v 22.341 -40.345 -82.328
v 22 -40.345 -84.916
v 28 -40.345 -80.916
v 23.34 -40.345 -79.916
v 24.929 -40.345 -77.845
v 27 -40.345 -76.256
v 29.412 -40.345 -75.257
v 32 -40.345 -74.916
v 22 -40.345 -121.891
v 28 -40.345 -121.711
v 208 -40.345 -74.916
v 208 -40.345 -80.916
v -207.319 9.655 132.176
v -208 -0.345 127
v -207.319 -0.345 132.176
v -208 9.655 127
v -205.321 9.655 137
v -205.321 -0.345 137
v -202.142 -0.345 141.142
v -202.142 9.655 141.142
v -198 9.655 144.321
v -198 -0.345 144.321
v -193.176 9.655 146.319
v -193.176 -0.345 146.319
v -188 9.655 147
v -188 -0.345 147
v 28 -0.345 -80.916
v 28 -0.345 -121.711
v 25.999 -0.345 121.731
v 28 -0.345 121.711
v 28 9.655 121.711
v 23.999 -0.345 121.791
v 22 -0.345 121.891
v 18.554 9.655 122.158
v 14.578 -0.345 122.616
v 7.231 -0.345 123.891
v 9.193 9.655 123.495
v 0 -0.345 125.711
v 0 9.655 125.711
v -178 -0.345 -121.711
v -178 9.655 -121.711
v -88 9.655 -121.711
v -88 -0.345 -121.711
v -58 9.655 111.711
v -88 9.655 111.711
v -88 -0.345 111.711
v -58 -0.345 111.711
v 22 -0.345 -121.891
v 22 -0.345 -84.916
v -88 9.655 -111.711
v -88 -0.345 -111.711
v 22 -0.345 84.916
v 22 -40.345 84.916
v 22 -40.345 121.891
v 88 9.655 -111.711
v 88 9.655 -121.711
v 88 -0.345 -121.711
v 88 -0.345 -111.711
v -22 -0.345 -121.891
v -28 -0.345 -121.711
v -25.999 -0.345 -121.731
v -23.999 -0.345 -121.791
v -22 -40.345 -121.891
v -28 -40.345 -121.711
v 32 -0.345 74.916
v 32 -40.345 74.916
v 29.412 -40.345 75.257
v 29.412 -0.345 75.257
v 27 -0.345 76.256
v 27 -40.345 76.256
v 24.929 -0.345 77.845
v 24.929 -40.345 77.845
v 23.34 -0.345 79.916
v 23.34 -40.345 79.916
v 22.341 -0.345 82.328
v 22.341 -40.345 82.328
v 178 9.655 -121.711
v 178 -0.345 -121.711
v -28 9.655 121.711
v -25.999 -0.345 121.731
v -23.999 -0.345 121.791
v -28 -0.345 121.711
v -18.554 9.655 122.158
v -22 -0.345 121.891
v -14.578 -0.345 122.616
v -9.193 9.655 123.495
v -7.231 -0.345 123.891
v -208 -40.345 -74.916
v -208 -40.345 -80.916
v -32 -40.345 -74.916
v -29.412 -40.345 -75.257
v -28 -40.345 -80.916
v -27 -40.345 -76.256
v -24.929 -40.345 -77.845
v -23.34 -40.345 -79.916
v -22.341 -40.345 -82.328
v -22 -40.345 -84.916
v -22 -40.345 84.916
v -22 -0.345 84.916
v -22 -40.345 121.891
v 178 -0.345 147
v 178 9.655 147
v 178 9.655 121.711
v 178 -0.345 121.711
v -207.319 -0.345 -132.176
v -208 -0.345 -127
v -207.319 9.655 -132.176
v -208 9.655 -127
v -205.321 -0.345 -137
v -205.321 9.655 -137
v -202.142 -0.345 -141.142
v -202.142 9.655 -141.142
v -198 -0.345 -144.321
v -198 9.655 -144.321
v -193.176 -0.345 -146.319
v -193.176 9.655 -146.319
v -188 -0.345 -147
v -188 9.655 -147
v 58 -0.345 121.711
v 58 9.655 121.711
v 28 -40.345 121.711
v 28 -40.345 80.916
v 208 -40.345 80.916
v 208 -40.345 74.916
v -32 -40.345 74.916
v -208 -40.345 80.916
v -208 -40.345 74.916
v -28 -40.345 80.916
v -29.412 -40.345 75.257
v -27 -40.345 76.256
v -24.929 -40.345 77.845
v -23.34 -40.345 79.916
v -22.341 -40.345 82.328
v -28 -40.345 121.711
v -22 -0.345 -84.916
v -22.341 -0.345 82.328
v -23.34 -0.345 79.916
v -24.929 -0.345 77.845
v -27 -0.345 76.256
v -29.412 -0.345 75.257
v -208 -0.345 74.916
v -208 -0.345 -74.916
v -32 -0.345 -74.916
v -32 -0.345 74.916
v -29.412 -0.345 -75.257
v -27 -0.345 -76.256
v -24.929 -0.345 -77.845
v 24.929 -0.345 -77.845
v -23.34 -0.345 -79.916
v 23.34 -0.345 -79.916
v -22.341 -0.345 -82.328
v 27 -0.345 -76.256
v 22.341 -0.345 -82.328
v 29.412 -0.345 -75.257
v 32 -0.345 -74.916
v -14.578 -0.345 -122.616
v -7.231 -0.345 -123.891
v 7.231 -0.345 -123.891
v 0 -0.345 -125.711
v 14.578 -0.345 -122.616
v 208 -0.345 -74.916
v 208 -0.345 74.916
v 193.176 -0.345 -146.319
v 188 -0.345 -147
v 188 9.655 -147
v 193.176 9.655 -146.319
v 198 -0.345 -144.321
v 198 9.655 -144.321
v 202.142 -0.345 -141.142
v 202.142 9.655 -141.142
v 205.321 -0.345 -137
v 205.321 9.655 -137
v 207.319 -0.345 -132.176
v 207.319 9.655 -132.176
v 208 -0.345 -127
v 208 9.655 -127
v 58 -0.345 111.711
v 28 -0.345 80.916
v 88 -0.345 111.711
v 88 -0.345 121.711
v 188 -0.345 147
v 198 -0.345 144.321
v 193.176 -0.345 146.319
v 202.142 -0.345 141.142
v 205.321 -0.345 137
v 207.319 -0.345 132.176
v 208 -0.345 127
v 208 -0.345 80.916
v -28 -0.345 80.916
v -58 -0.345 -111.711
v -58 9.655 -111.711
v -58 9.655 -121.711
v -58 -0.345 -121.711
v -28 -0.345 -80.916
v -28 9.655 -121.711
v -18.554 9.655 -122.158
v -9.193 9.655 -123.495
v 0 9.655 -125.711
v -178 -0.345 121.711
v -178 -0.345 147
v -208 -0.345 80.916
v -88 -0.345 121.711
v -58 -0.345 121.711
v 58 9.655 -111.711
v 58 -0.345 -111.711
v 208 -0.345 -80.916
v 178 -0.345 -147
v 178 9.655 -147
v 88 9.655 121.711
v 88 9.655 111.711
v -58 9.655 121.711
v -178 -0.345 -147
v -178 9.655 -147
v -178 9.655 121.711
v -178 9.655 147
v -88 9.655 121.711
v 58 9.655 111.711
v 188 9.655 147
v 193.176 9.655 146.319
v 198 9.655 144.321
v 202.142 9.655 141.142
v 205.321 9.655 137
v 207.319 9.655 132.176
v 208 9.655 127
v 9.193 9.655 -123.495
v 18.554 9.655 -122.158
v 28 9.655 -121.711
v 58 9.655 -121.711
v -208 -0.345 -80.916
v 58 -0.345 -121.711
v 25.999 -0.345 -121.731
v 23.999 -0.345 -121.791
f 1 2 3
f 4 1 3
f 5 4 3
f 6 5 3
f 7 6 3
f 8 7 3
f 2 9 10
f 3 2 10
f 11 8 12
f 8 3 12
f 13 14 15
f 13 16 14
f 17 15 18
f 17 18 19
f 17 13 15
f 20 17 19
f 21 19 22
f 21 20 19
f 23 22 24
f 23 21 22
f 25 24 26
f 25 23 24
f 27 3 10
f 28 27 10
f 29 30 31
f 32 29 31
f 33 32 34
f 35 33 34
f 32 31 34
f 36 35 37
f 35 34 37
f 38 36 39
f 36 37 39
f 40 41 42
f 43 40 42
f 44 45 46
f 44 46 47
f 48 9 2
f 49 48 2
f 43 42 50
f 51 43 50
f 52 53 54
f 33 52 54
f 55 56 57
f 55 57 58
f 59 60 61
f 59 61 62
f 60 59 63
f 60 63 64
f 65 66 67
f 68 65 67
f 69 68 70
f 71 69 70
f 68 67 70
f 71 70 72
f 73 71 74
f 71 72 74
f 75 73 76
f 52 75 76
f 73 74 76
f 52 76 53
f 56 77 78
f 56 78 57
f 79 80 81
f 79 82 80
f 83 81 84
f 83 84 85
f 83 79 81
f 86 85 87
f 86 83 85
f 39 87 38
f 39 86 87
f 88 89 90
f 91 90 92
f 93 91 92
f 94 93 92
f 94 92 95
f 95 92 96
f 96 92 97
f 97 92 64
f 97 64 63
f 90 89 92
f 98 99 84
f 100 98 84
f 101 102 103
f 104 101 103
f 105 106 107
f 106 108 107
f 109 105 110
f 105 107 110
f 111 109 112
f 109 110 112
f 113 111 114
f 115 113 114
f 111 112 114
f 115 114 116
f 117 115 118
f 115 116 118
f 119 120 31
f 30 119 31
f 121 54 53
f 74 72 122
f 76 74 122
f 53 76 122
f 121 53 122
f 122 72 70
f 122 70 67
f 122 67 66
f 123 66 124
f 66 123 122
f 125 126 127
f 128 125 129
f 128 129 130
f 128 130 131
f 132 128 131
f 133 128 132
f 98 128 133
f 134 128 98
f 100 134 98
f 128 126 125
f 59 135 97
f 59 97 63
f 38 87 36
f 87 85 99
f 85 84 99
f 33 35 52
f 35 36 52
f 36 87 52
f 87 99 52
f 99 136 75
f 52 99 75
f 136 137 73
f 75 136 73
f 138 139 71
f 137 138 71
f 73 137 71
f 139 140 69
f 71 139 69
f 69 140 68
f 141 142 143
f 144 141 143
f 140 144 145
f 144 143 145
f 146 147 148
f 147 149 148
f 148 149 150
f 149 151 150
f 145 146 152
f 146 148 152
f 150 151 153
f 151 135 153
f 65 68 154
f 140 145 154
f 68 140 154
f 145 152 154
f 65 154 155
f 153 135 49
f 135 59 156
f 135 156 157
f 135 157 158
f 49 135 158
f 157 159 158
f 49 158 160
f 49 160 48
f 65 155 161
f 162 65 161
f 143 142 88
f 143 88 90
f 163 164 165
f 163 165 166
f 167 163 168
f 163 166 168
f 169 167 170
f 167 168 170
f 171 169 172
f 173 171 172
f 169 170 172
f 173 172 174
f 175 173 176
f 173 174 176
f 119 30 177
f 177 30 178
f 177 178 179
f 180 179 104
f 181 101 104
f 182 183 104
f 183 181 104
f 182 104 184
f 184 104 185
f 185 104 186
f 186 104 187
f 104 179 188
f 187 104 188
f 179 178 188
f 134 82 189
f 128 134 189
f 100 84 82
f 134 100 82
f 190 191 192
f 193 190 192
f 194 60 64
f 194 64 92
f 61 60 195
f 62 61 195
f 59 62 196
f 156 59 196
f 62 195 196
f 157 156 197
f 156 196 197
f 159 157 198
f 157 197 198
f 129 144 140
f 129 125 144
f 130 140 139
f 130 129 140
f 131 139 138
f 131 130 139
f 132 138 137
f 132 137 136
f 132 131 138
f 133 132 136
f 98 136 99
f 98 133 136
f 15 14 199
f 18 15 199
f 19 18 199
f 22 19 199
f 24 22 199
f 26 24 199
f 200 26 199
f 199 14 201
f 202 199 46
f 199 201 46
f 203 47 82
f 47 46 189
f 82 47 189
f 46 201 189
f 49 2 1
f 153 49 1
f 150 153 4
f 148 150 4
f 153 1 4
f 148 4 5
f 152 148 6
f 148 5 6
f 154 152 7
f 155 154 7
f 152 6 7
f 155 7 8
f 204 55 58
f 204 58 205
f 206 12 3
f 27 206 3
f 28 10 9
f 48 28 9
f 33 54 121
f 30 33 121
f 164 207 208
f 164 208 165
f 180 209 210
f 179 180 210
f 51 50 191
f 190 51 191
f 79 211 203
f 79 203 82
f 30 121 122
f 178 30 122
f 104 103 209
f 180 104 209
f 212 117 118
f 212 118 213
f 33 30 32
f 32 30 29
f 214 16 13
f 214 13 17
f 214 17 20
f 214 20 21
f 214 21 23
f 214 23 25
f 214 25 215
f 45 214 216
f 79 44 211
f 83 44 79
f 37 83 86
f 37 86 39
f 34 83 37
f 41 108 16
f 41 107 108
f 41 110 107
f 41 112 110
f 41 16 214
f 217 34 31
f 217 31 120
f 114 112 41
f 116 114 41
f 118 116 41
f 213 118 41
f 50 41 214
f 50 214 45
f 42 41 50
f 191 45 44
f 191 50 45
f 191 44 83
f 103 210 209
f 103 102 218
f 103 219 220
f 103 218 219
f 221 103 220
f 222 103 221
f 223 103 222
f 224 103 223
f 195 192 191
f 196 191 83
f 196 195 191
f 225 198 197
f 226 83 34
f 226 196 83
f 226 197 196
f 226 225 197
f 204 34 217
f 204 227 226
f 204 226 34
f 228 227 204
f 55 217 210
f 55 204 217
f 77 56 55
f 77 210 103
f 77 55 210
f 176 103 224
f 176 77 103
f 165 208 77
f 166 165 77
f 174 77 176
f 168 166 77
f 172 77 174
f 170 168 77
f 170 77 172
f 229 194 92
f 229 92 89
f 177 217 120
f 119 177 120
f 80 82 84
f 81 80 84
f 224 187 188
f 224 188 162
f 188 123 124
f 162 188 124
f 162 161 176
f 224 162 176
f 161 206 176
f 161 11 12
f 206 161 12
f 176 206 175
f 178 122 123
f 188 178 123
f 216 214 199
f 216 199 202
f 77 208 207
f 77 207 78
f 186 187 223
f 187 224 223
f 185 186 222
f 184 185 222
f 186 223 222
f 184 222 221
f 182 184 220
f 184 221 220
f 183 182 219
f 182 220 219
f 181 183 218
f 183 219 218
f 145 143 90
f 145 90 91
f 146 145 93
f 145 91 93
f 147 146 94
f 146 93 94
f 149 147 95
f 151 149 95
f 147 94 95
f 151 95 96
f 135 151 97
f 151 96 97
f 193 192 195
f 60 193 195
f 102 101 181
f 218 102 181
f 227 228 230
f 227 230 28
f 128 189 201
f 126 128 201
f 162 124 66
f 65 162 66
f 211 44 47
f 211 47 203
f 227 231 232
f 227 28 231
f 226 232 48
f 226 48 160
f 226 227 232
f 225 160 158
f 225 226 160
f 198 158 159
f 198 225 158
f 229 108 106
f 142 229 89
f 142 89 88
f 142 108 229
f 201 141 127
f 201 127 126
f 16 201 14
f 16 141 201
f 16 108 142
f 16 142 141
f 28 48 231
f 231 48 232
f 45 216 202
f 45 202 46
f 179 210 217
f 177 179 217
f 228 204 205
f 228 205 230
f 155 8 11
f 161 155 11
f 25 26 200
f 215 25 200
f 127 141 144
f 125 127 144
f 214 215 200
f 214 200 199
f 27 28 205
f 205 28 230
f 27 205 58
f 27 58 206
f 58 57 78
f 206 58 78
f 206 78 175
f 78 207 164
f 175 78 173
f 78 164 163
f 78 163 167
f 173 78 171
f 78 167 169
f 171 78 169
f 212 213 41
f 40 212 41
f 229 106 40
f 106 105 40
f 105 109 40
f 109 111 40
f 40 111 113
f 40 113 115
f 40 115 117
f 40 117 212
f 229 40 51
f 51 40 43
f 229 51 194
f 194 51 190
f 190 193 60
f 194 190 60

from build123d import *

# Parameters (mm, degrees)
CROQUIS1_W               = 208
CROQUIS1_H               = 147
SALIENTE_EXTRUIR1_DEPTH  = 5
CORTAR_EXTRUIR1_DEPTH    = 128.449009412
SIMETR_A2_COPY_1_DEPTH   = 128.449009412
REDONDEO1_R              = 10
SALIENTE_EXTRUIR3_DEPTH  = 20
REDONDEO2_R              = 5
REDONDEO2_OF_SIMETR_A3_R = 5
SIMETR_A4_START          = -20
SIMETR_A4_DEPTH          = 20
ESCALA1_SCALE            = 2


# Read off the part's stored shape, not the designer's step: Simetría4
with BuildPart() as part:
    # Croquis1 → Saliente-Extruir1 (new body)
    with BuildSketch(Plane(origin=(0, 0, 0), x_dir=(1, 0, 0), z_dir=(0, 1, 0))):
        Rectangle(CROQUIS1_W, CROQUIS1_H)
    extrude(amount=SALIENTE_EXTRUIR1_DEPTH)

    # Croquis3 → Cortar-Extruir1 (cut, through all)
    with BuildSketch(Plane(origin=(0, 5, 0), x_dir=(1, 0, 0), z_dir=(0, 1, 0))):
        with BuildLine():
            Line((-89, 80.855395091), (-89, 60.855395091))
            Line((-89, 60.855395091), (-44, 60.855395091))
            Line((-44, 60.855395091), (-44, 55.855395091))
            Line((-44, 55.855395091), (-29, 55.855395091))
            Line((-29, 55.855395091), (-29, 60.855395091))
            Line((-29, 60.855395091), (-14, 60.855395091))
            ThreePointArc((-14, 60.855395091), (-6.928932188, 61.357920408), (0, 62.855395091))
            Line((0, 62.855395091), (0, 82.855395091))
            Line((0, 82.855395091), (-89, 82.855395091))
            Line((-89, 82.855395091), (-89, 80.855395091))
        make_face()
    cortar_extruir1 = extrude(amount=-CORTAR_EXTRUIR1_DEPTH, mode=Mode.SUBTRACT)

    # Simetría1: Cortar-Extruir1 across plane
    add(cortar_extruir1.mirror(Plane.XY), mode=Mode.SUBTRACT)

    # Simetría2: Cortar-Extruir1 across plane
    add(cortar_extruir1.mirror(Plane(origin=(0, 0, 0), x_dir=(0, 0, 1), z_dir=(1, 0, 0))), mode=Mode.SUBTRACT)

    # Simetría2 copy 1 sketch → Simetría2 copy 1 (cut, through all)
    with BuildSketch(Plane(origin=(0, 5, 0), x_dir=(-1, 0, 0), z_dir=(0, 1, 0))):
        with BuildLine():
            Line((-89, 80.855395091), (-89, 60.855395091))
            Line((-89, 60.855395091), (-44, 60.855395091))
            Line((-44, 60.855395091), (-44, 55.855395091))
            Line((-44, 55.855395091), (-29, 55.855395091))
            Line((-29, 55.855395091), (-29, 60.855395091))
            Line((-29, 60.855395091), (-14, 60.855395091))
            ThreePointArc((-14, 60.855395091), (-6.928932188, 61.357920408), (0, 62.855395091))
            Line((0, 62.855395091), (0, 82.855395091))
            Line((0, 82.855395091), (-89, 82.855395091))
            Line((-89, 82.855395091), (-89, 80.855395091))
        make_face()
    extrude(amount=-SIMETR_A2_COPY_1_DEPTH, mode=Mode.SUBTRACT)

    # Redondeo1
    redondeo1_edges = [part.edges().sort_by_distance(p)[0] for p in [
        (-104, 2.5, -73.5),
        (104, 2.5, -73.5),
        (104, 2.5, 73.5),
        (-104, 2.5, 73.5),
    ]]
    fillet(redondeo1_edges, radius=REDONDEO1_R)

    # Croquis5 → Saliente-Extruir3 (add)
    with BuildSketch(Plane.XZ):
        Polygon((-104, 37.458190843), (-11, 37.458190843), (-11, 60.945476237), (-14, 60.855395091), (-14, 40.458190843), (-104, 40.458190843), align=None)
    saliente_extruir3 = extrude(amount=SALIENTE_EXTRUIR3_DEPTH)

    # Redondeo2
    redondeo2_edges = [part.edges().sort_by_distance(p)[0] for p in [
        (-11, -10, 37.458190843),
    ]]
    fillet(redondeo2_edges, radius=REDONDEO2_R)

    # Simetría3: Saliente-Extruir3 across plane
    add(saliente_extruir3.mirror(Plane.XY))

    # Redondeo2 of Simetría3
    redondeo2_of_simetr_a3_edges = [part.edges().sort_by_distance(p)[0] for p in [
        (-11, -10, -37.458190843),
    ]]
    fillet(redondeo2_of_simetr_a3_edges, radius=REDONDEO2_OF_SIMETR_A3_R)

    # Simetría4 outline → Simetría4 (add)
    with BuildSketch(Plane(origin=(0, 0, 0), x_dir=(1, 0, 0), z_dir=(0, 1, 0)).offset(SIMETR_A4_START)):
        with BuildLine():
            Line((104, -40.458190843), (104, -37.458190843))
            Line((104, -37.458190843), (16, -37.458190843))
            ThreePointArc((16, -37.458190843), (12.464466094, -38.922656937), (11, -42.458190843))
            Line((11, -42.458190843), (11, -60.945476237))
            Line((11, -60.945476237), (14, -60.855395091))
            Line((14, -60.855395091), (14, -40.458190843))
            Line((14, -40.458190843), (104, -40.458190843))
        make_face()
        with BuildLine():
            Line((104, 37.458190843), (104, 40.458190843))
            Line((104, 40.458190843), (14, 40.458190843))
            Line((14, 40.458190843), (14, 60.855395091))
            Line((14, 60.855395091), (11, 60.945476237))
            Line((11, 60.945476237), (11, 42.458190843))
            ThreePointArc((11, 42.458190843), (12.464466094, 38.922656937), (16, 37.458190843))
            Line((16, 37.458190843), (104, 37.458190843))
        make_face()
    extrude(amount=SIMETR_A4_DEPTH)


with BuildPart() as part_1:
    # Escala1: scaled about (0, 0.344872769, 0)
    add(part.part.scale(ESCALA1_SCALE).moved(Location((0, -0.344872769, 0))))


solid = part_1.part
